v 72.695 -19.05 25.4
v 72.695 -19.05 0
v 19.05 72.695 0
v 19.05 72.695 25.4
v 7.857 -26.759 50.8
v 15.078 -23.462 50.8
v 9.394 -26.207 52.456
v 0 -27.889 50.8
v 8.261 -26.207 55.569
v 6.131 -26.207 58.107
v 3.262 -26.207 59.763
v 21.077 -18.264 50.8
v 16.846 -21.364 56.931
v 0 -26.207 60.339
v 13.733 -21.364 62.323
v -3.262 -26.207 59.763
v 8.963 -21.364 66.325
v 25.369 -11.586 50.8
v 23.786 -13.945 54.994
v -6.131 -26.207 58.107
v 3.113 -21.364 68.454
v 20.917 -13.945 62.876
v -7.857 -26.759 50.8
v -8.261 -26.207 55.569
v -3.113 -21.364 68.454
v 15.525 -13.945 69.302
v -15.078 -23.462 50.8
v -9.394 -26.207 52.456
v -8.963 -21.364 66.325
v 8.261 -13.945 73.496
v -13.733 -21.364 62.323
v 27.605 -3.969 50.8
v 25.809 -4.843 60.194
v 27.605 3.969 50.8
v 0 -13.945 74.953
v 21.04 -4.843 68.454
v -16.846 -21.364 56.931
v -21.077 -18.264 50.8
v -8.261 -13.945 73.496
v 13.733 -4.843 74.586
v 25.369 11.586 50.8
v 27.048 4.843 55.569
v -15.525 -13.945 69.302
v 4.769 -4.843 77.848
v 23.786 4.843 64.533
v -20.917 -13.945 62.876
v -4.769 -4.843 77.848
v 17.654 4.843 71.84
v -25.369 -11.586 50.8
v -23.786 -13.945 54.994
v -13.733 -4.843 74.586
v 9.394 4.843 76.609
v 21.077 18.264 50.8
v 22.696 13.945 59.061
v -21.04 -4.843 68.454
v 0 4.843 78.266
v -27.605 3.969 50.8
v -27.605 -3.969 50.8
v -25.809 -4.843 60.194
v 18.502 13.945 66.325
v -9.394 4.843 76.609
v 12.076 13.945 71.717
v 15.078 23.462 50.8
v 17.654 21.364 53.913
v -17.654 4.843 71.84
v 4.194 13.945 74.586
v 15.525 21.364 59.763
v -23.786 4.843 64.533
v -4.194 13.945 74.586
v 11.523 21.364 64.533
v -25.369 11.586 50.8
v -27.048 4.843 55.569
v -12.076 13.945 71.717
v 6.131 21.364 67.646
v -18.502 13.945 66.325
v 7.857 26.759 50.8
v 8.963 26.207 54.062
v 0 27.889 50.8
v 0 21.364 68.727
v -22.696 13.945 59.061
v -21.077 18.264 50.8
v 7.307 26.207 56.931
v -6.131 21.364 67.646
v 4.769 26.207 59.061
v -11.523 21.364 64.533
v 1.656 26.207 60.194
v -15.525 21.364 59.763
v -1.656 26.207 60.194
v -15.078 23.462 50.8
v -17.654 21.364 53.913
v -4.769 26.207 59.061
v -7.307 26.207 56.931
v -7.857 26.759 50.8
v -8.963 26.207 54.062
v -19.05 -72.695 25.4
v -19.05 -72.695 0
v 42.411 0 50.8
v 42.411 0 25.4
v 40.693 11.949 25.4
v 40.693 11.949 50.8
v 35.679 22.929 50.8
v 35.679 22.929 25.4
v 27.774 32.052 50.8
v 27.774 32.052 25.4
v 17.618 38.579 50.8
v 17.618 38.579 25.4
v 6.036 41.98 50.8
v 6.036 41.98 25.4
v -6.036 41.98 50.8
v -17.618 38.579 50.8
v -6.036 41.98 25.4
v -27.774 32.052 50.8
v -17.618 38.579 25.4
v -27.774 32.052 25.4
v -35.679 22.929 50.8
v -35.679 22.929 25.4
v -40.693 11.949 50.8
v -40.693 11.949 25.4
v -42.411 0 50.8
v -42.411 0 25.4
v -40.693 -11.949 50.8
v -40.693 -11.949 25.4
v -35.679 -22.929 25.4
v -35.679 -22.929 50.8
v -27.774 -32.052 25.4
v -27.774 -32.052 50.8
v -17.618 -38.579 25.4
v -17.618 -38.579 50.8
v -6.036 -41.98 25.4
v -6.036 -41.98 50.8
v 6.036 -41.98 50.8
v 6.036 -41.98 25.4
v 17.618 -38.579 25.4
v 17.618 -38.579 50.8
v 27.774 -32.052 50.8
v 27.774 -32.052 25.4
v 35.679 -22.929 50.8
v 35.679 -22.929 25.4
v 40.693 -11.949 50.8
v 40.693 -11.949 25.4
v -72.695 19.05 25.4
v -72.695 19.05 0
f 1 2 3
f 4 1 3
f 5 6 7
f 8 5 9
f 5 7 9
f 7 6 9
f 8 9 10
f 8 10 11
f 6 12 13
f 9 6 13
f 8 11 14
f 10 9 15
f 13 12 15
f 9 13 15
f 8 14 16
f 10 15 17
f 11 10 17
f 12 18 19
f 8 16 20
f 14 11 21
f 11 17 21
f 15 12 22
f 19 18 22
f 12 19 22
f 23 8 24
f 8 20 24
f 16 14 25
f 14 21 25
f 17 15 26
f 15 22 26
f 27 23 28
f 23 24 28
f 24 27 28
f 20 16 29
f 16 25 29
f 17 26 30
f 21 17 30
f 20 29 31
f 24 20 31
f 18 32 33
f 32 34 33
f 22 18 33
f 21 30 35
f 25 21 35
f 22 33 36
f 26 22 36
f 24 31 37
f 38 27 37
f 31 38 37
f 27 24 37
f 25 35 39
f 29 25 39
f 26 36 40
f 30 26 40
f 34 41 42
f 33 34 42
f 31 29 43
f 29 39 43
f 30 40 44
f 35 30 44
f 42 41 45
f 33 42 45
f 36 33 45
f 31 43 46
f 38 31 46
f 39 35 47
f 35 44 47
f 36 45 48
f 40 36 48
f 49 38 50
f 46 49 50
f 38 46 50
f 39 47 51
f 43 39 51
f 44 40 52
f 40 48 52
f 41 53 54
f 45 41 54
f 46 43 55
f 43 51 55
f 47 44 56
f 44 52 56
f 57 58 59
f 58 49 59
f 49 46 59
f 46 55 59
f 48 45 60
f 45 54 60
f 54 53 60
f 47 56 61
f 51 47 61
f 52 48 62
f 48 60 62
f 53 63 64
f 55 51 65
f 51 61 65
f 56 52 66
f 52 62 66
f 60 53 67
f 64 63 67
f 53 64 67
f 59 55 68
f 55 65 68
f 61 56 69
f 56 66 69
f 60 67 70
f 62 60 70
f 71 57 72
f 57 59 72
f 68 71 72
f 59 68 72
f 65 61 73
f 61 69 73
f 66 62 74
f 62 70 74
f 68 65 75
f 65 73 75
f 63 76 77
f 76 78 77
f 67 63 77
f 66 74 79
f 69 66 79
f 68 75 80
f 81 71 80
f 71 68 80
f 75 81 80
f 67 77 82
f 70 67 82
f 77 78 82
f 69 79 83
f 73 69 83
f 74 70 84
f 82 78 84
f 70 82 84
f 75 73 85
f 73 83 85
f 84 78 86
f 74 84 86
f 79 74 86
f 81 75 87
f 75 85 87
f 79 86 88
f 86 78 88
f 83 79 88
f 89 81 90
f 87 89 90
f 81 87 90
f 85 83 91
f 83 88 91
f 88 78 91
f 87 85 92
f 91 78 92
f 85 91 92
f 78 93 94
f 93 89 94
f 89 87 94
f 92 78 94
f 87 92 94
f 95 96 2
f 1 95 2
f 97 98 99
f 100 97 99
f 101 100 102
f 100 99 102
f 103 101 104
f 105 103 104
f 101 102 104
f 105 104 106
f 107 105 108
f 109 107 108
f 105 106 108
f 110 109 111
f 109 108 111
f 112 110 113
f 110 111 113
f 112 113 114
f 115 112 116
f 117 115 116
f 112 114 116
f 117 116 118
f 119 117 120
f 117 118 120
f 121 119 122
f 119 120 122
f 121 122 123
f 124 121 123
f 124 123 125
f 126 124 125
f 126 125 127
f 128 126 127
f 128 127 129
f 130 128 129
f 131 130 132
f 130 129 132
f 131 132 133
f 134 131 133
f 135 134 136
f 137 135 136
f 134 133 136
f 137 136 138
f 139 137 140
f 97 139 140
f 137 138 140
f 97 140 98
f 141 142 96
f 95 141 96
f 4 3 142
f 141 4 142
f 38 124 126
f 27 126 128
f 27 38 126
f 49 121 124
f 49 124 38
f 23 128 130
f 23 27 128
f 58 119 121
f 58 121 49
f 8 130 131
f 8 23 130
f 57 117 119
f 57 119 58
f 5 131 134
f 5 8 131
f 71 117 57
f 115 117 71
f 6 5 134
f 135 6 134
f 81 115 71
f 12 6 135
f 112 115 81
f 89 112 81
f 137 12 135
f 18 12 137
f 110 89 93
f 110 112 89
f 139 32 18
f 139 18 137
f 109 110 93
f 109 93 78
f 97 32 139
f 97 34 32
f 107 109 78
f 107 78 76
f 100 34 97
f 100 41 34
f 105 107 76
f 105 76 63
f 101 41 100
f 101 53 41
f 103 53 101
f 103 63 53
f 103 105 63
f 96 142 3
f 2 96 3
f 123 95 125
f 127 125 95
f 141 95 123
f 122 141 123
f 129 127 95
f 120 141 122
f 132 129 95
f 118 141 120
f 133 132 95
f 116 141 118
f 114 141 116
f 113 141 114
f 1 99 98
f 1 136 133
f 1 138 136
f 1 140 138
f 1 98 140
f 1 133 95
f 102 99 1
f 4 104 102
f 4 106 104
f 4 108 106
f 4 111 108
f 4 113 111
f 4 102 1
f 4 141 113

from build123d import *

# Parameters (mm, degrees)
F1_DEPTH = 25.4
F2_R     = 42.411309
F3_DEPTH = 25.4


with BuildPart() as f1:
    # F0 (on Top) → F1 (new body)
    with BuildSketch(Plane.XY):
        Polygon((19.05, 72.694803), (-72.694803, 19.05), (-19.05, -72.694803), (72.694803, -19.05), align=None)
    extrude(amount=F1_DEPTH)

    # F2 (on face) → F3 (join)
    with BuildSketch(Plane.XY.offset(25.4)):
        Circle(F2_R)
    extrude(amount=F3_DEPTH)

    # F4 (on face) → F5 (revolve)
    with BuildSketch(Plane.XY.offset(50.8)):
        with BuildLine():
            Line((0, 27.8892), (0, -27.8892))
            ThreePointArc((0, -27.8892), (27.8892, 0), (0, 27.8892))
        make_face()
    revolve(axis=Axis((0, 0, 50.8), (0, -1, 0)))


solid = f1.part
